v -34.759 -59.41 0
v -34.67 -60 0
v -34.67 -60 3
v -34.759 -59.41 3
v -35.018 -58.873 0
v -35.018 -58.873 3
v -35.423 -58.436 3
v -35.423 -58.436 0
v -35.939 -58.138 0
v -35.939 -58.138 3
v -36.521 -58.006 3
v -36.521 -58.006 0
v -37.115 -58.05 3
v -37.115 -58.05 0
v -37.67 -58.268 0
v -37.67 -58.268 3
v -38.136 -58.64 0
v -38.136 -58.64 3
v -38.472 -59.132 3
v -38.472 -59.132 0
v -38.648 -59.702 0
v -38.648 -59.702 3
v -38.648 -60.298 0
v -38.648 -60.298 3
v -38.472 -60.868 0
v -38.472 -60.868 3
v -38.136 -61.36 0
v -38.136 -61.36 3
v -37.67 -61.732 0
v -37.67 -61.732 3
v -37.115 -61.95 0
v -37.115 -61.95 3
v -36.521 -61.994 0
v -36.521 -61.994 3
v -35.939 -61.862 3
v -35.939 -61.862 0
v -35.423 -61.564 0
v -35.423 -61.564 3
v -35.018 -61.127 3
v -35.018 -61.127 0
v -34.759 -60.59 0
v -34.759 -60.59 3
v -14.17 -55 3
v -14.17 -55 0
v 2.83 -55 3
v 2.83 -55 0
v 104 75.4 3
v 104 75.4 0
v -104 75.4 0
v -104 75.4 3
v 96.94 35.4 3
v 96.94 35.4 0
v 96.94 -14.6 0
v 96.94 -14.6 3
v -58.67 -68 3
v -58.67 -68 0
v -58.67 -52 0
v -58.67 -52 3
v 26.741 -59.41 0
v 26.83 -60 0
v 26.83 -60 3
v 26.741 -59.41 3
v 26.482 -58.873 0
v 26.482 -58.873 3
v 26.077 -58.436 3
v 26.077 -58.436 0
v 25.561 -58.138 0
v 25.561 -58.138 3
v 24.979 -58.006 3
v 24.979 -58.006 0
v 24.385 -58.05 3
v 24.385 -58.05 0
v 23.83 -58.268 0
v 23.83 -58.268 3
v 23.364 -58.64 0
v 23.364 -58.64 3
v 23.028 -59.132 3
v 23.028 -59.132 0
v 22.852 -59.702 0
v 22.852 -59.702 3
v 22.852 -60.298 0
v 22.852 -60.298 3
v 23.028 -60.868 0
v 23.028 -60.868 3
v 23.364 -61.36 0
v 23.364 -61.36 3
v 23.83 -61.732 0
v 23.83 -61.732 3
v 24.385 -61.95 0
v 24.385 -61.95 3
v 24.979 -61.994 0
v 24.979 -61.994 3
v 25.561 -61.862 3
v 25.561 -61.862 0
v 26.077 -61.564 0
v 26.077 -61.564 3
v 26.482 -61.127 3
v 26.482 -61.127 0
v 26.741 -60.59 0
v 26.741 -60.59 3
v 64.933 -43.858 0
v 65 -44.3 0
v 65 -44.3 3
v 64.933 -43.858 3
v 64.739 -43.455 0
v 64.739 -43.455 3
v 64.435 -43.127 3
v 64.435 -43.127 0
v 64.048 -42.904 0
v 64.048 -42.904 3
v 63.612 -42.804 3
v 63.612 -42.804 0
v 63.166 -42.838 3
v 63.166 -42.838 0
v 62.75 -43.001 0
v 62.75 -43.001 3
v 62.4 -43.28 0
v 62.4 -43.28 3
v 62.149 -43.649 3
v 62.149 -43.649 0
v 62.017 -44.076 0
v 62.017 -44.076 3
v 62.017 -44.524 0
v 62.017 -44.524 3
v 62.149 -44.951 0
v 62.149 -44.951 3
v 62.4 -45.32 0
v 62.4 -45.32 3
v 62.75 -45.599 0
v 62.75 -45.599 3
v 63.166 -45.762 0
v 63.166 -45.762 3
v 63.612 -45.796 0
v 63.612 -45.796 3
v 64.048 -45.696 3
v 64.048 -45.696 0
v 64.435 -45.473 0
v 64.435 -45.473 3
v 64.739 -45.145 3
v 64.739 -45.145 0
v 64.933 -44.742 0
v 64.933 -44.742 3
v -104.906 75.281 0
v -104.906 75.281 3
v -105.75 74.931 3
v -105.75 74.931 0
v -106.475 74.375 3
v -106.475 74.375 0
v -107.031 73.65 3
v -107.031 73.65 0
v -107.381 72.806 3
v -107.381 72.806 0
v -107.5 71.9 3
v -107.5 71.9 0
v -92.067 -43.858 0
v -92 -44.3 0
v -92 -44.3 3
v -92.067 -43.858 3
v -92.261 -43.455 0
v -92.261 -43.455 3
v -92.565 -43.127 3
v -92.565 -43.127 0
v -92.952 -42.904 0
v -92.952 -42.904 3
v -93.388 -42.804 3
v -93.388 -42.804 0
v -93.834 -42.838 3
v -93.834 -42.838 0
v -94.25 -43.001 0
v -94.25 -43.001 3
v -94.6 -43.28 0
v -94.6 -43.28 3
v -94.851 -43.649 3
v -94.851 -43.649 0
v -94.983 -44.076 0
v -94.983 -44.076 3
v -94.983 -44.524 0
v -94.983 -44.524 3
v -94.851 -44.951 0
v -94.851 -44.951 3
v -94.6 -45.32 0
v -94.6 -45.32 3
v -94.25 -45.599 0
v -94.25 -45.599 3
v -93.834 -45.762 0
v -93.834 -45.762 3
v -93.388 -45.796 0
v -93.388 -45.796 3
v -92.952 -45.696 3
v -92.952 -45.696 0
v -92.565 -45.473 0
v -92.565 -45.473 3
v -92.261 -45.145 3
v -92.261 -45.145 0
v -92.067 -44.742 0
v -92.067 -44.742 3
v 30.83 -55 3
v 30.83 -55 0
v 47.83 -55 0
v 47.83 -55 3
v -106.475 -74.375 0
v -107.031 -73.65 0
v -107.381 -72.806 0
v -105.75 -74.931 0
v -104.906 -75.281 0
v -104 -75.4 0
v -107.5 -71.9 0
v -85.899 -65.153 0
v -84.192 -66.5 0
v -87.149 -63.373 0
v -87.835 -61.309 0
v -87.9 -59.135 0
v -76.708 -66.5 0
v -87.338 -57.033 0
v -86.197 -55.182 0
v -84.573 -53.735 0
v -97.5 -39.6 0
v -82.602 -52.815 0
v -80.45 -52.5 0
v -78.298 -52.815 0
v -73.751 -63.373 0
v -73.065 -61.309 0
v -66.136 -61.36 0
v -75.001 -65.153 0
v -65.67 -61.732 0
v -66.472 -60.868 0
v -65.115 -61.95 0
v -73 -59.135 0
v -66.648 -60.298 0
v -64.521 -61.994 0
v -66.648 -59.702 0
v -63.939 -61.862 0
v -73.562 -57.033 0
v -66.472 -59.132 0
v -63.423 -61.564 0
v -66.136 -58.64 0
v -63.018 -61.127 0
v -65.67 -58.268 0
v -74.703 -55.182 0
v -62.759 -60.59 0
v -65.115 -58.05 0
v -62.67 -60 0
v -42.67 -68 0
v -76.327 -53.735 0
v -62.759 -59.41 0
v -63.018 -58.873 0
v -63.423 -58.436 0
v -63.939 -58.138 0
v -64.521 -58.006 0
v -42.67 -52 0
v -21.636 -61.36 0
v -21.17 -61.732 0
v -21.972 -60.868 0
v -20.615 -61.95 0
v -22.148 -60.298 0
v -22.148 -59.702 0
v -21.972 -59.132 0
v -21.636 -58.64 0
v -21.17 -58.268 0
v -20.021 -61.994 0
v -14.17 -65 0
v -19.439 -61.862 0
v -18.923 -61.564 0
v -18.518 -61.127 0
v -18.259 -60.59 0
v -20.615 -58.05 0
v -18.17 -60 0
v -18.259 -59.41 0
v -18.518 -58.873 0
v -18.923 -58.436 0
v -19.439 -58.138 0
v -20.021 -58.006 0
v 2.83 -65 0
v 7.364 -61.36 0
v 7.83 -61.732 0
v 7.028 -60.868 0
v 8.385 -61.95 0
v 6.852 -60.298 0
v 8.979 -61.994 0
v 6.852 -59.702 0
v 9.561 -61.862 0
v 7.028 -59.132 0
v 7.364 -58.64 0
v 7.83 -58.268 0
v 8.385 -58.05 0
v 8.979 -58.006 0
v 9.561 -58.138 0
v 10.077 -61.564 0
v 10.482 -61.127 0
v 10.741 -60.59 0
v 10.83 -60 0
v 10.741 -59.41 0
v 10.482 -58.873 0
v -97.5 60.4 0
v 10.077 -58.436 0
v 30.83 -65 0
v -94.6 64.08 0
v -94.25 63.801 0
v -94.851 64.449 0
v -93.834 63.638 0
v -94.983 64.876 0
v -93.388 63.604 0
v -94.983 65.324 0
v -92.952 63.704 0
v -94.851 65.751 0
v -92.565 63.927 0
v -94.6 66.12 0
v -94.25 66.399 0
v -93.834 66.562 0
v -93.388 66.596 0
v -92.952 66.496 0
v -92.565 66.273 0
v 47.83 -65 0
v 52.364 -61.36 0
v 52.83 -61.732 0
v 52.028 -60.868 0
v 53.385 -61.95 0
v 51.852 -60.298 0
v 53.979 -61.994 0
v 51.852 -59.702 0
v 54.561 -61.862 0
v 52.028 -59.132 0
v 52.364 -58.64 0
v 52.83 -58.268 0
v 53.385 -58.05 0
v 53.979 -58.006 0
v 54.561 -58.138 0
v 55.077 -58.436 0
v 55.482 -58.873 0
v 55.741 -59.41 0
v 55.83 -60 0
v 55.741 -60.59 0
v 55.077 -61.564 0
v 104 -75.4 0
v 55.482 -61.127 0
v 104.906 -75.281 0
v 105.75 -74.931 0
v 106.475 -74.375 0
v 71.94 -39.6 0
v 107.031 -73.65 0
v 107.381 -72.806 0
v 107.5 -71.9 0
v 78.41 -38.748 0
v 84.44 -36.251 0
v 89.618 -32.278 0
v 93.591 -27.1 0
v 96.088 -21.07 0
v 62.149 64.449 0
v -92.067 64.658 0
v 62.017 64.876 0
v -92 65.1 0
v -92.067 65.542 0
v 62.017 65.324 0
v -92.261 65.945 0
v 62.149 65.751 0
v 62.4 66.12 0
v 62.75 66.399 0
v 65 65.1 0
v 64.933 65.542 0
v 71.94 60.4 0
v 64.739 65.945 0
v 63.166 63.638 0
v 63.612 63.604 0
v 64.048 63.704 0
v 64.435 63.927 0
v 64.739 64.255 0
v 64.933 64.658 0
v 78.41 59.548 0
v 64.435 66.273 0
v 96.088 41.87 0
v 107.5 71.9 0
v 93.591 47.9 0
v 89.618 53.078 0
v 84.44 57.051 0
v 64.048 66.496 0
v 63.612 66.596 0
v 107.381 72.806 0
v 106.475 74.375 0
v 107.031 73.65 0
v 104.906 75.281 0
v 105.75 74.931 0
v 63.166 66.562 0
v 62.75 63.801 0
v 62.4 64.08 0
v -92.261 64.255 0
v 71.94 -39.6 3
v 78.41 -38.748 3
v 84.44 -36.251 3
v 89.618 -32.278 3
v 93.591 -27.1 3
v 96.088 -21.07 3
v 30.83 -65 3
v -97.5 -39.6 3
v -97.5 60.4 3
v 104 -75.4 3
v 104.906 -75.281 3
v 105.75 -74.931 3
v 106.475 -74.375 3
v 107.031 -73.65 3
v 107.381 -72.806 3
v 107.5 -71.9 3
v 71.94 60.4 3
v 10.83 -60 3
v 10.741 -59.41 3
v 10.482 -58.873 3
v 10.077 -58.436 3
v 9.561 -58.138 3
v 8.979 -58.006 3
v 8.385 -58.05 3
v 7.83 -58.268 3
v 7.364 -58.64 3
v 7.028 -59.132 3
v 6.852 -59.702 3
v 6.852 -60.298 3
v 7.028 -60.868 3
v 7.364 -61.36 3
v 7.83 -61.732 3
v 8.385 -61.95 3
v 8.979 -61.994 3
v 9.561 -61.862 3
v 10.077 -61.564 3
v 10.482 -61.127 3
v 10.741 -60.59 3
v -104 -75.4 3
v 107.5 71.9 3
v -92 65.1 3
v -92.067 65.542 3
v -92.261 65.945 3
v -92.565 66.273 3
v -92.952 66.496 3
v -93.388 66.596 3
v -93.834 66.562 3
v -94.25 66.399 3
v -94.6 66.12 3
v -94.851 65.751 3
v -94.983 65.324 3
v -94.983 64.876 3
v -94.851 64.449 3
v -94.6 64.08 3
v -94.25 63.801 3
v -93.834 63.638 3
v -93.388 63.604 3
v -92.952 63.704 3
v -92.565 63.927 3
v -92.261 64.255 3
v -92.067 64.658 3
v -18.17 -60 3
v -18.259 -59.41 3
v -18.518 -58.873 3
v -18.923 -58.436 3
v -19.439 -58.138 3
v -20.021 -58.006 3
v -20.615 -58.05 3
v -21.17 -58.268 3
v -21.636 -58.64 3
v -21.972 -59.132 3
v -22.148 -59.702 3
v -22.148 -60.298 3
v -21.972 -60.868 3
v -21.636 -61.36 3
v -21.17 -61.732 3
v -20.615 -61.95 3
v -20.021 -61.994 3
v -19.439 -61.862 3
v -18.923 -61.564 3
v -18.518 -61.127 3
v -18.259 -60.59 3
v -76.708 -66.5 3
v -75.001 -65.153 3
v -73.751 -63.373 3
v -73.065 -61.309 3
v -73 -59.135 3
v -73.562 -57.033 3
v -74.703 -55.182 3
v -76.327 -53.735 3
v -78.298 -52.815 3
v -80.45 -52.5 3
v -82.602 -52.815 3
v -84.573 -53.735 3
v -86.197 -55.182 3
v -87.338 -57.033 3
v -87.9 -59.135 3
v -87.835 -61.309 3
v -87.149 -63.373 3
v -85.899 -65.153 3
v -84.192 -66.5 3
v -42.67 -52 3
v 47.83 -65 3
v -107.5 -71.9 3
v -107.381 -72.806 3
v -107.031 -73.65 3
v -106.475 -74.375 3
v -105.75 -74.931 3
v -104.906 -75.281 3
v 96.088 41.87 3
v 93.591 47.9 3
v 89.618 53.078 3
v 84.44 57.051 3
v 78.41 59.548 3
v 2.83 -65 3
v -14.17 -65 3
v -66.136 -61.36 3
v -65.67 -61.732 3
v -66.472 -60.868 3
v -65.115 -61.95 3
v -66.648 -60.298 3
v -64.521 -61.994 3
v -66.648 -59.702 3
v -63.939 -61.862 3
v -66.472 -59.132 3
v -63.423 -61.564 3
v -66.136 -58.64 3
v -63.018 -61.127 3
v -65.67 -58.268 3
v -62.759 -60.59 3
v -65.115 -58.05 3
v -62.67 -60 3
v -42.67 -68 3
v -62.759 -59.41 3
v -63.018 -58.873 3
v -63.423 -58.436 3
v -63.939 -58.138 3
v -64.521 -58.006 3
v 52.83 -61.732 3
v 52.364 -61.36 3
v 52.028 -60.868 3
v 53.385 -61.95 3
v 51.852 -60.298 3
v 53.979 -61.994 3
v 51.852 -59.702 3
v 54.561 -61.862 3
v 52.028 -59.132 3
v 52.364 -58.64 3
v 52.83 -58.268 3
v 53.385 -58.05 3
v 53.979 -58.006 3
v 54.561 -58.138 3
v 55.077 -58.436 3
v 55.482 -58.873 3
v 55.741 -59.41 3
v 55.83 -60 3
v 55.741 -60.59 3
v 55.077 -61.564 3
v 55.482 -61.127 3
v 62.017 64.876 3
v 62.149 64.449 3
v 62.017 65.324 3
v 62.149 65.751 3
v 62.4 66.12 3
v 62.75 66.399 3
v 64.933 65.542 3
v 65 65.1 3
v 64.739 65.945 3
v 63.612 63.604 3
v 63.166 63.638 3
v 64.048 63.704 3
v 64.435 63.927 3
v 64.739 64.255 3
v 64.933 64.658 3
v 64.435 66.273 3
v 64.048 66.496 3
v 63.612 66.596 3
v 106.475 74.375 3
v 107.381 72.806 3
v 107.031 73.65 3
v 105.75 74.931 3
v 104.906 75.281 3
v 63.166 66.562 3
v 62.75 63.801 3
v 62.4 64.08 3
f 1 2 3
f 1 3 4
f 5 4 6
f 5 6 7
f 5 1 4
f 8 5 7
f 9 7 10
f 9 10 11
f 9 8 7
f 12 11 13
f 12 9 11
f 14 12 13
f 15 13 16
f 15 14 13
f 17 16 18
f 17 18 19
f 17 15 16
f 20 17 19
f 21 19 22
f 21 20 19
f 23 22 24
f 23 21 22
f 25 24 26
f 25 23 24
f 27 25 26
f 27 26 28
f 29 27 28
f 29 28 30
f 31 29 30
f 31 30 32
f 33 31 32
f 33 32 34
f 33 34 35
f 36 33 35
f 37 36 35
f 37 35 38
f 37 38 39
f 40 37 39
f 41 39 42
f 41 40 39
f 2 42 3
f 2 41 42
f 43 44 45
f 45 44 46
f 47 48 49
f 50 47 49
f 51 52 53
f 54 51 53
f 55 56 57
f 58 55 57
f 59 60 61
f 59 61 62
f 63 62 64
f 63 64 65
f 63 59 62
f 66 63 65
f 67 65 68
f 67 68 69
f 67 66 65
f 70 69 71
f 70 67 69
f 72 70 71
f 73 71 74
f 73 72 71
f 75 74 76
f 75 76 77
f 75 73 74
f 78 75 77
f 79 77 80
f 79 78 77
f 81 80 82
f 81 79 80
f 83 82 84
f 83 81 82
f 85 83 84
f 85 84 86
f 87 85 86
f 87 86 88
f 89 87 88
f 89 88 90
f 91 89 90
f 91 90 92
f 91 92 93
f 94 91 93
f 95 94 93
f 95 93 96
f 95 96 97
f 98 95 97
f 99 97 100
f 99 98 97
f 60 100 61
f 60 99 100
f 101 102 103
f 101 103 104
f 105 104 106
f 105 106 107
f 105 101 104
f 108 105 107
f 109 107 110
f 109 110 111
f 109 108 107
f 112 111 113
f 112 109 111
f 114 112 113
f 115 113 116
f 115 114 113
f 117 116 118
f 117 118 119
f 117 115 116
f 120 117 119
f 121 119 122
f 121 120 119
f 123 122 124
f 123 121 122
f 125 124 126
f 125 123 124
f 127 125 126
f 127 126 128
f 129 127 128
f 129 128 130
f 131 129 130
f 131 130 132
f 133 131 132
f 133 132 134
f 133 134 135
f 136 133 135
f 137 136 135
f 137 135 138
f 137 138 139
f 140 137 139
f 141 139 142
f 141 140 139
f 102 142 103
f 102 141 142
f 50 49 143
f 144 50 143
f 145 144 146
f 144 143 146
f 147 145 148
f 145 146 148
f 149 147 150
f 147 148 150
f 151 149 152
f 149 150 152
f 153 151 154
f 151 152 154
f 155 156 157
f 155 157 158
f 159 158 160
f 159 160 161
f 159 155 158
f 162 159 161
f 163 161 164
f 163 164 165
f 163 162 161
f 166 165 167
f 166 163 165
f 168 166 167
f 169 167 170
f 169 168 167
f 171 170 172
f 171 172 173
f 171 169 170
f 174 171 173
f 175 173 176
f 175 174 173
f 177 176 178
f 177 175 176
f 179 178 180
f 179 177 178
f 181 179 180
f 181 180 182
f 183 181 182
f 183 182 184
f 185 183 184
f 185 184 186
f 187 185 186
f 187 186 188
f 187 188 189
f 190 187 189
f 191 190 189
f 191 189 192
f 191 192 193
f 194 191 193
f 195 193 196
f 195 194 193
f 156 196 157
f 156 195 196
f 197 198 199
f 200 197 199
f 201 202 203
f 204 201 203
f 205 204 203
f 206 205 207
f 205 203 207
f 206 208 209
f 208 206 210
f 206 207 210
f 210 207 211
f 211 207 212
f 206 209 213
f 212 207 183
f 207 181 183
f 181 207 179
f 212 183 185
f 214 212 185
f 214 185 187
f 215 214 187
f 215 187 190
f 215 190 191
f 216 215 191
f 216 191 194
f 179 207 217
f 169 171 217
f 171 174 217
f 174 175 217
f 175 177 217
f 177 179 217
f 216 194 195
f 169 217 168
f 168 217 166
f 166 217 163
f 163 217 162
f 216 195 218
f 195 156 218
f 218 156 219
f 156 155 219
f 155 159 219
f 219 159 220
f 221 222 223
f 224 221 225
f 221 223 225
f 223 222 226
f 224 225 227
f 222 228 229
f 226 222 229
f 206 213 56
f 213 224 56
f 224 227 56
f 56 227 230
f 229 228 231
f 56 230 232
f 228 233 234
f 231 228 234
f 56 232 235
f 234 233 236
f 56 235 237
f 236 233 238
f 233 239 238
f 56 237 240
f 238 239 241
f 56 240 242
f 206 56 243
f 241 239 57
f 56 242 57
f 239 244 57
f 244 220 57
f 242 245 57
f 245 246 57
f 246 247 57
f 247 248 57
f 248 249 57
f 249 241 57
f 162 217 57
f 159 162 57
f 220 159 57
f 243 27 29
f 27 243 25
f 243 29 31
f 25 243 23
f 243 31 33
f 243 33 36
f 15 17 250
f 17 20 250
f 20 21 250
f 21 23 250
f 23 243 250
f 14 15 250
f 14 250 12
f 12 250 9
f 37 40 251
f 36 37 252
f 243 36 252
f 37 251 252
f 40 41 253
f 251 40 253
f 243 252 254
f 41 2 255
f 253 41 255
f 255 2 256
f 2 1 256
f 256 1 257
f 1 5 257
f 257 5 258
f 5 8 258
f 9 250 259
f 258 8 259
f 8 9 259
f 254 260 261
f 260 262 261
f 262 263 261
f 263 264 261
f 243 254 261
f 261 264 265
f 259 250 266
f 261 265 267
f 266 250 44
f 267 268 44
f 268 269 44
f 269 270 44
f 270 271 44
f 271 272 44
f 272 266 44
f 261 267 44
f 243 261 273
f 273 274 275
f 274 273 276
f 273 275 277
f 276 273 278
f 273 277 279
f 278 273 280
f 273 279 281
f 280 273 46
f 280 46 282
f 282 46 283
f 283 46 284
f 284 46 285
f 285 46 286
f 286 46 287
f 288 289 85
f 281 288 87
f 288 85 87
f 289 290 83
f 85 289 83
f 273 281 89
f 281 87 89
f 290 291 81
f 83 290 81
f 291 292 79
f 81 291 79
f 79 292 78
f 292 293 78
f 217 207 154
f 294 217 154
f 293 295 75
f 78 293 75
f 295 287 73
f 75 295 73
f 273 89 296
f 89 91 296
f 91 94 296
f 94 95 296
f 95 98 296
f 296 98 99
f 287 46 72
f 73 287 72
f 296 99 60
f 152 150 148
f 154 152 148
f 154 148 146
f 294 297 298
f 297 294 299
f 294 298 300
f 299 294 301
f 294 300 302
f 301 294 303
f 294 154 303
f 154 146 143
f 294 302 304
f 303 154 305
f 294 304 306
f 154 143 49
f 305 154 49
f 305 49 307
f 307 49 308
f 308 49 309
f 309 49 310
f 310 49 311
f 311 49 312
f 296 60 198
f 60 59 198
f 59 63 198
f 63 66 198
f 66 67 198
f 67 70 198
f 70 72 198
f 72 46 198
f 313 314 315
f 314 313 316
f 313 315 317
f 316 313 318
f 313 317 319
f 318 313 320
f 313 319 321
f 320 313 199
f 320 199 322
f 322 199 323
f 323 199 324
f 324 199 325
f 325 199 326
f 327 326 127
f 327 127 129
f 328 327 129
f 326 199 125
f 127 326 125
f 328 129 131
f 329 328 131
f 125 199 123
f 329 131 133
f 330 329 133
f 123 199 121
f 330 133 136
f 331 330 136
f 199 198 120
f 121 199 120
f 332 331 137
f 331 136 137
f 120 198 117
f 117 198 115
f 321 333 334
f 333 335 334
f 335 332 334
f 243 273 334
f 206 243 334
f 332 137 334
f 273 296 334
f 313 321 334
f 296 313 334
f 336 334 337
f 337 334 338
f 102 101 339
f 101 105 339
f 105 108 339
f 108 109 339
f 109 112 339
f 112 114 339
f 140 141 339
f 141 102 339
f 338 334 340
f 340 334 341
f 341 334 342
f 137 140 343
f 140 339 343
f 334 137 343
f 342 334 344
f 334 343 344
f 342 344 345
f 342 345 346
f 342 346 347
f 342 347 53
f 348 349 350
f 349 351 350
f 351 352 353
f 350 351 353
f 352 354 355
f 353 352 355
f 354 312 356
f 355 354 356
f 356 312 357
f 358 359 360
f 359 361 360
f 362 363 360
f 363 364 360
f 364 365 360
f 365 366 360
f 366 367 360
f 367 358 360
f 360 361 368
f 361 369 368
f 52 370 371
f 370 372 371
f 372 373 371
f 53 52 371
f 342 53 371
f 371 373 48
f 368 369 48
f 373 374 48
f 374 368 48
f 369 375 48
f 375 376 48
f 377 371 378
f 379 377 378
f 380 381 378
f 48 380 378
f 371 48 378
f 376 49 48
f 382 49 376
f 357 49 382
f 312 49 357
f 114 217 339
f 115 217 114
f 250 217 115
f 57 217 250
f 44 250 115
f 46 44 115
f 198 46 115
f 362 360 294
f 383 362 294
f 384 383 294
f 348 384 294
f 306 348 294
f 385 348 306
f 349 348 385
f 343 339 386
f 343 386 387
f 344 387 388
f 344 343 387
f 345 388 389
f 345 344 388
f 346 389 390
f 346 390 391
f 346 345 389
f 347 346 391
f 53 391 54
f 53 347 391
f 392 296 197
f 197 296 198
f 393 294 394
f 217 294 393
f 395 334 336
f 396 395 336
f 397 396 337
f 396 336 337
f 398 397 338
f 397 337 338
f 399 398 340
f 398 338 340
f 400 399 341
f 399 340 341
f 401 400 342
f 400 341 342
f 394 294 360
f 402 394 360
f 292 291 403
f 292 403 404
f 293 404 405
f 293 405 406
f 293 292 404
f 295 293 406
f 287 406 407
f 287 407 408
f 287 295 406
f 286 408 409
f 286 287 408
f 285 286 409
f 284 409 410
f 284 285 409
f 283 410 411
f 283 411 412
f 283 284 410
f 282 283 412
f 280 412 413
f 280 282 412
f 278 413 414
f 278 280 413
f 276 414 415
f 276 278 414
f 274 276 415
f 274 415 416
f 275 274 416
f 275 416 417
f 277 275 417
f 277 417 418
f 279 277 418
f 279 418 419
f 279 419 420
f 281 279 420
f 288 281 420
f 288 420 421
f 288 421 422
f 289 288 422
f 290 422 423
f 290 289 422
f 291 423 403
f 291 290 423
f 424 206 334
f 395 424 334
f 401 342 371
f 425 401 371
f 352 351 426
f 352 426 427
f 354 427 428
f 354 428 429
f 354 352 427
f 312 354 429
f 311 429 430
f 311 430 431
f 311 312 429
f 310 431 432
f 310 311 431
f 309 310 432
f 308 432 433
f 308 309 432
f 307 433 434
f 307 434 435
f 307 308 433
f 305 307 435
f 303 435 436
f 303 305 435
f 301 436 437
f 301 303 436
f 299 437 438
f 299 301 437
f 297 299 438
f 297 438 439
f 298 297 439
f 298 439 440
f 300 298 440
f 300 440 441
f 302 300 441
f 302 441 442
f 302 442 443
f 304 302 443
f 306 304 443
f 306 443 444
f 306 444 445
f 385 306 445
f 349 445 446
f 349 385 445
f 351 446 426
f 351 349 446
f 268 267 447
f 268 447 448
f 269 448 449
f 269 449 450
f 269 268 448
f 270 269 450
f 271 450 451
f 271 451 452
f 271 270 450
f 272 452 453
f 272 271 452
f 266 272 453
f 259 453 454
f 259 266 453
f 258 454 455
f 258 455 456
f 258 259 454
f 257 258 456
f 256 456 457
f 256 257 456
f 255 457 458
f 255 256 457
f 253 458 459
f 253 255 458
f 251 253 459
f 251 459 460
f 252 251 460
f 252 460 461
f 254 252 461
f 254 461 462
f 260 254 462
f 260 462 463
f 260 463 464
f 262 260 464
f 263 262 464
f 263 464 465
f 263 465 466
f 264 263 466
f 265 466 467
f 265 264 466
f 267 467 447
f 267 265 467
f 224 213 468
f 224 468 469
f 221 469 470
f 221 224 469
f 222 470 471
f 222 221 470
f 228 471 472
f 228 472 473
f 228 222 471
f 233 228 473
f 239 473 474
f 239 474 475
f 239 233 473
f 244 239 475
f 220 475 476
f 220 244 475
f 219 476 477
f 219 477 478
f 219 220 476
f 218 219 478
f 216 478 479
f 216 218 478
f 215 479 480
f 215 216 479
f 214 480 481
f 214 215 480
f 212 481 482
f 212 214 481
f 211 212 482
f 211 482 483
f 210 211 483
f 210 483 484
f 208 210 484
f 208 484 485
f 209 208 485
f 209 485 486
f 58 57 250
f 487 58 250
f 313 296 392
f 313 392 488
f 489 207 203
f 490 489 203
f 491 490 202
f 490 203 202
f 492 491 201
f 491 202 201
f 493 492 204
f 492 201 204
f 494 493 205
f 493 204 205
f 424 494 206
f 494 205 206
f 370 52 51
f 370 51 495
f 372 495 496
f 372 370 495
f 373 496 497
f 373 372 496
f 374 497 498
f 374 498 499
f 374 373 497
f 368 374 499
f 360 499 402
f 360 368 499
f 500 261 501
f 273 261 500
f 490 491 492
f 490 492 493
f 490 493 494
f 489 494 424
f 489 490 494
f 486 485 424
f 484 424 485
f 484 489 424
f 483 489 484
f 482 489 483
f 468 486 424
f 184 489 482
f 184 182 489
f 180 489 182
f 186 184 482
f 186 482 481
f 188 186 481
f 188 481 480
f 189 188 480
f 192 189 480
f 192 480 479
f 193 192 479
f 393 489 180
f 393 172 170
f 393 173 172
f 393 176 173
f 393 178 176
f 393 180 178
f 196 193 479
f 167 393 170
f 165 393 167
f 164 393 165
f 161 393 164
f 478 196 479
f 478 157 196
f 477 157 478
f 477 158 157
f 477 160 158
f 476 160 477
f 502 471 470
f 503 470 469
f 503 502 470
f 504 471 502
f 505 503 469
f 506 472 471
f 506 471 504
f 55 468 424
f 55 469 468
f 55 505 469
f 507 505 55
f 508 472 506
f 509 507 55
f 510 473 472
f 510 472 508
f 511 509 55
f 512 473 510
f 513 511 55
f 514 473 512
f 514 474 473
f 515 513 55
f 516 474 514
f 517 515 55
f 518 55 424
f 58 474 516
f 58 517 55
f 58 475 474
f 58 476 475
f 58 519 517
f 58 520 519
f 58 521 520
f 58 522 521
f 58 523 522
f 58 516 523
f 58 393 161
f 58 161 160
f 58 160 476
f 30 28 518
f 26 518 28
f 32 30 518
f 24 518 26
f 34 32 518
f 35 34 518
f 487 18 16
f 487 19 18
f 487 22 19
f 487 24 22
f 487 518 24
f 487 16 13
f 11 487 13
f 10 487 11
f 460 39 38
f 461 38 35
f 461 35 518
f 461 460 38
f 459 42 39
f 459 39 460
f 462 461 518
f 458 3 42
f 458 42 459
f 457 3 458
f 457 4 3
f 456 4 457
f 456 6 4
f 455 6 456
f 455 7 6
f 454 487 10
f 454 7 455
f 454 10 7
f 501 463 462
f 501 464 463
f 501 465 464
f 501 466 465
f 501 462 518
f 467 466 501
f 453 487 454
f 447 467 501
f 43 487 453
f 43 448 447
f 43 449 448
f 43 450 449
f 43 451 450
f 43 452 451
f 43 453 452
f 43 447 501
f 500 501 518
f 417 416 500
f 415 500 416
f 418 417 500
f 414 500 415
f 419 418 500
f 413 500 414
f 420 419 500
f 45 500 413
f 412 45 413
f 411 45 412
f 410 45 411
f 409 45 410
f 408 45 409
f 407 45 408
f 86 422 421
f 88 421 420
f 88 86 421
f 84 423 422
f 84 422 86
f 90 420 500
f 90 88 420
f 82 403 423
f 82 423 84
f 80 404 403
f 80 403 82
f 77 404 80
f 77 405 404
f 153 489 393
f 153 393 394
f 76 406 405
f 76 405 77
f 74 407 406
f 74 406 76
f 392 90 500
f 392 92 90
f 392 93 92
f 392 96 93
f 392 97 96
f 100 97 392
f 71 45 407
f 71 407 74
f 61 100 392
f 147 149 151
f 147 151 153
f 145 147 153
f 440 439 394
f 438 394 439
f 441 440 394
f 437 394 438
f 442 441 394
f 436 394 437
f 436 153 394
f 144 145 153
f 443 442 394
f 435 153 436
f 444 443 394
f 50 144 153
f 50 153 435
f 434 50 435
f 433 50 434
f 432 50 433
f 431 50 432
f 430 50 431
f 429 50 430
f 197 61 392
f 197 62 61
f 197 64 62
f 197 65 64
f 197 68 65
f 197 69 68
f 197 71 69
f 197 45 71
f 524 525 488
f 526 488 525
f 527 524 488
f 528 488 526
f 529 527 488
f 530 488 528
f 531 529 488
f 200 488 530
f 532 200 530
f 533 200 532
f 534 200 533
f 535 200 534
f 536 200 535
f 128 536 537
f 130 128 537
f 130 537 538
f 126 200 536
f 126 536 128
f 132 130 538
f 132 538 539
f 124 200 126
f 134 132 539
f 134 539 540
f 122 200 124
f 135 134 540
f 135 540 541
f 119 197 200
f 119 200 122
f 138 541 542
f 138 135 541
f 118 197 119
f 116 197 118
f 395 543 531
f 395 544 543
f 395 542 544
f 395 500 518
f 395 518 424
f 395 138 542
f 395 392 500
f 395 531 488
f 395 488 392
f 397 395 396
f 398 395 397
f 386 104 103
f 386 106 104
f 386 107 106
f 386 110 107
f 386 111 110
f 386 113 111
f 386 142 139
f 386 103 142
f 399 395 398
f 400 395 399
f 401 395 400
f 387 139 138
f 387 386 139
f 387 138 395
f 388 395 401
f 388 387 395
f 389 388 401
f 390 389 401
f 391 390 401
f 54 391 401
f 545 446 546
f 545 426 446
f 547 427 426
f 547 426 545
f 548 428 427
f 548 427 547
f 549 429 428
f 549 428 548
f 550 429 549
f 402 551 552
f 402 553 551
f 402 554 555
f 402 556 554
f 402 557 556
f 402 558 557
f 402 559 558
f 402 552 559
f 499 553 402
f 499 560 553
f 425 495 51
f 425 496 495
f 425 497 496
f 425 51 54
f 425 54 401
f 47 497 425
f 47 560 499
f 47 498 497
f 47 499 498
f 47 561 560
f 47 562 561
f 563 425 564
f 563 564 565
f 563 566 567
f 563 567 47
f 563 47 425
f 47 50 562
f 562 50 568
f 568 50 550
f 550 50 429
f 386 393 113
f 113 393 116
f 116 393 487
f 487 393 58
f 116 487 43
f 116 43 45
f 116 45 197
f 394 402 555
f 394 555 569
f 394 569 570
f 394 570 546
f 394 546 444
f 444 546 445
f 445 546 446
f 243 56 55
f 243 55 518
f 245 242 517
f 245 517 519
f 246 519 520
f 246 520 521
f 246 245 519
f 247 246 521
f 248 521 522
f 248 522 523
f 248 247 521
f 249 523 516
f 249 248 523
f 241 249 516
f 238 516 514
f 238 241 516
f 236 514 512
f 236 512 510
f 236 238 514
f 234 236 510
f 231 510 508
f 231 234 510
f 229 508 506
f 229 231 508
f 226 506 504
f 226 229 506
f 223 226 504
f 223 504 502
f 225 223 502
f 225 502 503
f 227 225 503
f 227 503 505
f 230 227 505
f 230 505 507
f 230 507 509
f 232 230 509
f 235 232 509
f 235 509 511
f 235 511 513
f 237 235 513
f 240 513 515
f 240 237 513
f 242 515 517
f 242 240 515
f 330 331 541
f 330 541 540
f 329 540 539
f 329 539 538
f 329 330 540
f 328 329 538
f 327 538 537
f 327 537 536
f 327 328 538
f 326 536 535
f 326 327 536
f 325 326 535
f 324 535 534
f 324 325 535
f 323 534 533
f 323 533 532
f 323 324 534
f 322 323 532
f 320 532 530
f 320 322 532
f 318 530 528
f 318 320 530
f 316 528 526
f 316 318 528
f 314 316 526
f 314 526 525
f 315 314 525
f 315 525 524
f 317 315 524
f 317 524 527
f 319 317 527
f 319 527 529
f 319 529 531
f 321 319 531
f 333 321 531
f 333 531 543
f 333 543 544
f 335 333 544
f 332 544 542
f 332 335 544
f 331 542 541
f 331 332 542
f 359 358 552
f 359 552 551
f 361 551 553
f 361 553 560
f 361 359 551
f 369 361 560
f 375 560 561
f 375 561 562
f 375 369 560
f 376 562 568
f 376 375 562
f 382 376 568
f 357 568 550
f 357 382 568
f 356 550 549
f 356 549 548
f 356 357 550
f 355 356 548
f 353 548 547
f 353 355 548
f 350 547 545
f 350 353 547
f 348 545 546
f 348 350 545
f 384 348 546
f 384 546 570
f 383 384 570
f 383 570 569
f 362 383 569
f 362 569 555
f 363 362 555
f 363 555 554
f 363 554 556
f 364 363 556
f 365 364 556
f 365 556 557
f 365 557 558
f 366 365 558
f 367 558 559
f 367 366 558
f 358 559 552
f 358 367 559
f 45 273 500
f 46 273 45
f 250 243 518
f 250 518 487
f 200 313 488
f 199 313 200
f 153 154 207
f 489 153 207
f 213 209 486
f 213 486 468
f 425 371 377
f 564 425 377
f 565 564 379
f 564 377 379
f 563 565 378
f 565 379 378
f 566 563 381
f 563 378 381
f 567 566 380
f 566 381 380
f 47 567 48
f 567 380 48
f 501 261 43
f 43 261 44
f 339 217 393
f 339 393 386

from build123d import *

# Parameters (mm, degrees)
SKETCH_R      = 1.5
SKETCH_R_2    = 2
SKETCH_W      = 17
SKETCH_H      = 10
SKETCH_W_2    = 16
SKETCH_H_2    = 16
EXTRUDE_DEPTH = 3


with BuildPart() as part:
    # Sketch → Extrude (new body)
    with BuildSketch(Plane.XY):
        with BuildLine():
            Line((-104, -75.4), (104, -75.4))
            ThreePointArc((104, -75.4), (106.474874, -74.374874), (107.5, -71.9))
            Line((107.5, -71.9), (107.5, 71.9))
            ThreePointArc((107.5, 71.9), (106.474874, 74.374874), (104, 75.4))
            Line((104, 75.4), (-104, 75.4))
            ThreePointArc((-104, 75.4), (-106.474874, 74.374874), (-107.5, 71.9))
            Line((-107.5, 71.9), (-107.5, -71.9))
            ThreePointArc((-107.5, -71.9), (-106.474874, -74.374874), (-104, -75.4))
        make_face()
        with Locations((-93.5, 65.1)):
            Circle(SKETCH_R, mode=Mode.SUBTRACT)
        with Locations((63.5, 65.1)):
            Circle(SKETCH_R, mode=Mode.SUBTRACT)
        with Locations((-93.5, -44.3)):
            Circle(SKETCH_R, mode=Mode.SUBTRACT)
        with Locations((63.5, -44.3)):
            Circle(SKETCH_R, mode=Mode.SUBTRACT)
        with Locations((-20.17, -60)):
            Circle(SKETCH_R_2, mode=Mode.SUBTRACT)
        with Locations((8.83, -60)):
            Circle(SKETCH_R_2, mode=Mode.SUBTRACT)
        with Locations((-64.67, -60)):
            Circle(SKETCH_R_2, mode=Mode.SUBTRACT)
        with Locations((-36.67, -60)):
            Circle(SKETCH_R_2, mode=Mode.SUBTRACT)
        with Locations((24.83, -60)):
            Circle(SKETCH_R_2, mode=Mode.SUBTRACT)
        with Locations((53.83, -60)):
            Circle(SKETCH_R_2, mode=Mode.SUBTRACT)
        with BuildLine():
            Line((-97.5, -39.6), (67.5, -39.6))
            Line((67.5, -39.6), (71.94, -39.6))
            ThreePointArc((71.94, -39.6), (89.61767, -32.27767), (96.94, -14.6))
            Line((96.94, 35.4), (96.94, -14.6))
            ThreePointArc((96.94, 35.4), (89.61767, 53.07767), (71.94, 60.4))
            Line((67.5, 60.4), (71.94, 60.4))
            Line((67.5, 60.4), (-97.5, 60.4))
            Line((-97.5, 60.4), (-97.5, -39.6))
        make_face(mode=Mode.SUBTRACT)
        with BuildLine():
            ThreePointArc((-76.708343, -66.5), (-80.45, -52.5), (-84.191657, -66.5))
            Line((-84.191657, -66.5), (-76.708343, -66.5))
        make_face(mode=Mode.SUBTRACT)
        with Locations((-5.67, -60)):
            Rectangle(SKETCH_W, SKETCH_H, mode=Mode.SUBTRACT)
        with Locations((-50.67, -60)):
            Rectangle(SKETCH_W_2, SKETCH_H_2, mode=Mode.SUBTRACT)
        with Locations((39.33, -60)):
            Rectangle(SKETCH_W, SKETCH_H, mode=Mode.SUBTRACT)
    extrude(amount=EXTRUDE_DEPTH)


solid = part.part
